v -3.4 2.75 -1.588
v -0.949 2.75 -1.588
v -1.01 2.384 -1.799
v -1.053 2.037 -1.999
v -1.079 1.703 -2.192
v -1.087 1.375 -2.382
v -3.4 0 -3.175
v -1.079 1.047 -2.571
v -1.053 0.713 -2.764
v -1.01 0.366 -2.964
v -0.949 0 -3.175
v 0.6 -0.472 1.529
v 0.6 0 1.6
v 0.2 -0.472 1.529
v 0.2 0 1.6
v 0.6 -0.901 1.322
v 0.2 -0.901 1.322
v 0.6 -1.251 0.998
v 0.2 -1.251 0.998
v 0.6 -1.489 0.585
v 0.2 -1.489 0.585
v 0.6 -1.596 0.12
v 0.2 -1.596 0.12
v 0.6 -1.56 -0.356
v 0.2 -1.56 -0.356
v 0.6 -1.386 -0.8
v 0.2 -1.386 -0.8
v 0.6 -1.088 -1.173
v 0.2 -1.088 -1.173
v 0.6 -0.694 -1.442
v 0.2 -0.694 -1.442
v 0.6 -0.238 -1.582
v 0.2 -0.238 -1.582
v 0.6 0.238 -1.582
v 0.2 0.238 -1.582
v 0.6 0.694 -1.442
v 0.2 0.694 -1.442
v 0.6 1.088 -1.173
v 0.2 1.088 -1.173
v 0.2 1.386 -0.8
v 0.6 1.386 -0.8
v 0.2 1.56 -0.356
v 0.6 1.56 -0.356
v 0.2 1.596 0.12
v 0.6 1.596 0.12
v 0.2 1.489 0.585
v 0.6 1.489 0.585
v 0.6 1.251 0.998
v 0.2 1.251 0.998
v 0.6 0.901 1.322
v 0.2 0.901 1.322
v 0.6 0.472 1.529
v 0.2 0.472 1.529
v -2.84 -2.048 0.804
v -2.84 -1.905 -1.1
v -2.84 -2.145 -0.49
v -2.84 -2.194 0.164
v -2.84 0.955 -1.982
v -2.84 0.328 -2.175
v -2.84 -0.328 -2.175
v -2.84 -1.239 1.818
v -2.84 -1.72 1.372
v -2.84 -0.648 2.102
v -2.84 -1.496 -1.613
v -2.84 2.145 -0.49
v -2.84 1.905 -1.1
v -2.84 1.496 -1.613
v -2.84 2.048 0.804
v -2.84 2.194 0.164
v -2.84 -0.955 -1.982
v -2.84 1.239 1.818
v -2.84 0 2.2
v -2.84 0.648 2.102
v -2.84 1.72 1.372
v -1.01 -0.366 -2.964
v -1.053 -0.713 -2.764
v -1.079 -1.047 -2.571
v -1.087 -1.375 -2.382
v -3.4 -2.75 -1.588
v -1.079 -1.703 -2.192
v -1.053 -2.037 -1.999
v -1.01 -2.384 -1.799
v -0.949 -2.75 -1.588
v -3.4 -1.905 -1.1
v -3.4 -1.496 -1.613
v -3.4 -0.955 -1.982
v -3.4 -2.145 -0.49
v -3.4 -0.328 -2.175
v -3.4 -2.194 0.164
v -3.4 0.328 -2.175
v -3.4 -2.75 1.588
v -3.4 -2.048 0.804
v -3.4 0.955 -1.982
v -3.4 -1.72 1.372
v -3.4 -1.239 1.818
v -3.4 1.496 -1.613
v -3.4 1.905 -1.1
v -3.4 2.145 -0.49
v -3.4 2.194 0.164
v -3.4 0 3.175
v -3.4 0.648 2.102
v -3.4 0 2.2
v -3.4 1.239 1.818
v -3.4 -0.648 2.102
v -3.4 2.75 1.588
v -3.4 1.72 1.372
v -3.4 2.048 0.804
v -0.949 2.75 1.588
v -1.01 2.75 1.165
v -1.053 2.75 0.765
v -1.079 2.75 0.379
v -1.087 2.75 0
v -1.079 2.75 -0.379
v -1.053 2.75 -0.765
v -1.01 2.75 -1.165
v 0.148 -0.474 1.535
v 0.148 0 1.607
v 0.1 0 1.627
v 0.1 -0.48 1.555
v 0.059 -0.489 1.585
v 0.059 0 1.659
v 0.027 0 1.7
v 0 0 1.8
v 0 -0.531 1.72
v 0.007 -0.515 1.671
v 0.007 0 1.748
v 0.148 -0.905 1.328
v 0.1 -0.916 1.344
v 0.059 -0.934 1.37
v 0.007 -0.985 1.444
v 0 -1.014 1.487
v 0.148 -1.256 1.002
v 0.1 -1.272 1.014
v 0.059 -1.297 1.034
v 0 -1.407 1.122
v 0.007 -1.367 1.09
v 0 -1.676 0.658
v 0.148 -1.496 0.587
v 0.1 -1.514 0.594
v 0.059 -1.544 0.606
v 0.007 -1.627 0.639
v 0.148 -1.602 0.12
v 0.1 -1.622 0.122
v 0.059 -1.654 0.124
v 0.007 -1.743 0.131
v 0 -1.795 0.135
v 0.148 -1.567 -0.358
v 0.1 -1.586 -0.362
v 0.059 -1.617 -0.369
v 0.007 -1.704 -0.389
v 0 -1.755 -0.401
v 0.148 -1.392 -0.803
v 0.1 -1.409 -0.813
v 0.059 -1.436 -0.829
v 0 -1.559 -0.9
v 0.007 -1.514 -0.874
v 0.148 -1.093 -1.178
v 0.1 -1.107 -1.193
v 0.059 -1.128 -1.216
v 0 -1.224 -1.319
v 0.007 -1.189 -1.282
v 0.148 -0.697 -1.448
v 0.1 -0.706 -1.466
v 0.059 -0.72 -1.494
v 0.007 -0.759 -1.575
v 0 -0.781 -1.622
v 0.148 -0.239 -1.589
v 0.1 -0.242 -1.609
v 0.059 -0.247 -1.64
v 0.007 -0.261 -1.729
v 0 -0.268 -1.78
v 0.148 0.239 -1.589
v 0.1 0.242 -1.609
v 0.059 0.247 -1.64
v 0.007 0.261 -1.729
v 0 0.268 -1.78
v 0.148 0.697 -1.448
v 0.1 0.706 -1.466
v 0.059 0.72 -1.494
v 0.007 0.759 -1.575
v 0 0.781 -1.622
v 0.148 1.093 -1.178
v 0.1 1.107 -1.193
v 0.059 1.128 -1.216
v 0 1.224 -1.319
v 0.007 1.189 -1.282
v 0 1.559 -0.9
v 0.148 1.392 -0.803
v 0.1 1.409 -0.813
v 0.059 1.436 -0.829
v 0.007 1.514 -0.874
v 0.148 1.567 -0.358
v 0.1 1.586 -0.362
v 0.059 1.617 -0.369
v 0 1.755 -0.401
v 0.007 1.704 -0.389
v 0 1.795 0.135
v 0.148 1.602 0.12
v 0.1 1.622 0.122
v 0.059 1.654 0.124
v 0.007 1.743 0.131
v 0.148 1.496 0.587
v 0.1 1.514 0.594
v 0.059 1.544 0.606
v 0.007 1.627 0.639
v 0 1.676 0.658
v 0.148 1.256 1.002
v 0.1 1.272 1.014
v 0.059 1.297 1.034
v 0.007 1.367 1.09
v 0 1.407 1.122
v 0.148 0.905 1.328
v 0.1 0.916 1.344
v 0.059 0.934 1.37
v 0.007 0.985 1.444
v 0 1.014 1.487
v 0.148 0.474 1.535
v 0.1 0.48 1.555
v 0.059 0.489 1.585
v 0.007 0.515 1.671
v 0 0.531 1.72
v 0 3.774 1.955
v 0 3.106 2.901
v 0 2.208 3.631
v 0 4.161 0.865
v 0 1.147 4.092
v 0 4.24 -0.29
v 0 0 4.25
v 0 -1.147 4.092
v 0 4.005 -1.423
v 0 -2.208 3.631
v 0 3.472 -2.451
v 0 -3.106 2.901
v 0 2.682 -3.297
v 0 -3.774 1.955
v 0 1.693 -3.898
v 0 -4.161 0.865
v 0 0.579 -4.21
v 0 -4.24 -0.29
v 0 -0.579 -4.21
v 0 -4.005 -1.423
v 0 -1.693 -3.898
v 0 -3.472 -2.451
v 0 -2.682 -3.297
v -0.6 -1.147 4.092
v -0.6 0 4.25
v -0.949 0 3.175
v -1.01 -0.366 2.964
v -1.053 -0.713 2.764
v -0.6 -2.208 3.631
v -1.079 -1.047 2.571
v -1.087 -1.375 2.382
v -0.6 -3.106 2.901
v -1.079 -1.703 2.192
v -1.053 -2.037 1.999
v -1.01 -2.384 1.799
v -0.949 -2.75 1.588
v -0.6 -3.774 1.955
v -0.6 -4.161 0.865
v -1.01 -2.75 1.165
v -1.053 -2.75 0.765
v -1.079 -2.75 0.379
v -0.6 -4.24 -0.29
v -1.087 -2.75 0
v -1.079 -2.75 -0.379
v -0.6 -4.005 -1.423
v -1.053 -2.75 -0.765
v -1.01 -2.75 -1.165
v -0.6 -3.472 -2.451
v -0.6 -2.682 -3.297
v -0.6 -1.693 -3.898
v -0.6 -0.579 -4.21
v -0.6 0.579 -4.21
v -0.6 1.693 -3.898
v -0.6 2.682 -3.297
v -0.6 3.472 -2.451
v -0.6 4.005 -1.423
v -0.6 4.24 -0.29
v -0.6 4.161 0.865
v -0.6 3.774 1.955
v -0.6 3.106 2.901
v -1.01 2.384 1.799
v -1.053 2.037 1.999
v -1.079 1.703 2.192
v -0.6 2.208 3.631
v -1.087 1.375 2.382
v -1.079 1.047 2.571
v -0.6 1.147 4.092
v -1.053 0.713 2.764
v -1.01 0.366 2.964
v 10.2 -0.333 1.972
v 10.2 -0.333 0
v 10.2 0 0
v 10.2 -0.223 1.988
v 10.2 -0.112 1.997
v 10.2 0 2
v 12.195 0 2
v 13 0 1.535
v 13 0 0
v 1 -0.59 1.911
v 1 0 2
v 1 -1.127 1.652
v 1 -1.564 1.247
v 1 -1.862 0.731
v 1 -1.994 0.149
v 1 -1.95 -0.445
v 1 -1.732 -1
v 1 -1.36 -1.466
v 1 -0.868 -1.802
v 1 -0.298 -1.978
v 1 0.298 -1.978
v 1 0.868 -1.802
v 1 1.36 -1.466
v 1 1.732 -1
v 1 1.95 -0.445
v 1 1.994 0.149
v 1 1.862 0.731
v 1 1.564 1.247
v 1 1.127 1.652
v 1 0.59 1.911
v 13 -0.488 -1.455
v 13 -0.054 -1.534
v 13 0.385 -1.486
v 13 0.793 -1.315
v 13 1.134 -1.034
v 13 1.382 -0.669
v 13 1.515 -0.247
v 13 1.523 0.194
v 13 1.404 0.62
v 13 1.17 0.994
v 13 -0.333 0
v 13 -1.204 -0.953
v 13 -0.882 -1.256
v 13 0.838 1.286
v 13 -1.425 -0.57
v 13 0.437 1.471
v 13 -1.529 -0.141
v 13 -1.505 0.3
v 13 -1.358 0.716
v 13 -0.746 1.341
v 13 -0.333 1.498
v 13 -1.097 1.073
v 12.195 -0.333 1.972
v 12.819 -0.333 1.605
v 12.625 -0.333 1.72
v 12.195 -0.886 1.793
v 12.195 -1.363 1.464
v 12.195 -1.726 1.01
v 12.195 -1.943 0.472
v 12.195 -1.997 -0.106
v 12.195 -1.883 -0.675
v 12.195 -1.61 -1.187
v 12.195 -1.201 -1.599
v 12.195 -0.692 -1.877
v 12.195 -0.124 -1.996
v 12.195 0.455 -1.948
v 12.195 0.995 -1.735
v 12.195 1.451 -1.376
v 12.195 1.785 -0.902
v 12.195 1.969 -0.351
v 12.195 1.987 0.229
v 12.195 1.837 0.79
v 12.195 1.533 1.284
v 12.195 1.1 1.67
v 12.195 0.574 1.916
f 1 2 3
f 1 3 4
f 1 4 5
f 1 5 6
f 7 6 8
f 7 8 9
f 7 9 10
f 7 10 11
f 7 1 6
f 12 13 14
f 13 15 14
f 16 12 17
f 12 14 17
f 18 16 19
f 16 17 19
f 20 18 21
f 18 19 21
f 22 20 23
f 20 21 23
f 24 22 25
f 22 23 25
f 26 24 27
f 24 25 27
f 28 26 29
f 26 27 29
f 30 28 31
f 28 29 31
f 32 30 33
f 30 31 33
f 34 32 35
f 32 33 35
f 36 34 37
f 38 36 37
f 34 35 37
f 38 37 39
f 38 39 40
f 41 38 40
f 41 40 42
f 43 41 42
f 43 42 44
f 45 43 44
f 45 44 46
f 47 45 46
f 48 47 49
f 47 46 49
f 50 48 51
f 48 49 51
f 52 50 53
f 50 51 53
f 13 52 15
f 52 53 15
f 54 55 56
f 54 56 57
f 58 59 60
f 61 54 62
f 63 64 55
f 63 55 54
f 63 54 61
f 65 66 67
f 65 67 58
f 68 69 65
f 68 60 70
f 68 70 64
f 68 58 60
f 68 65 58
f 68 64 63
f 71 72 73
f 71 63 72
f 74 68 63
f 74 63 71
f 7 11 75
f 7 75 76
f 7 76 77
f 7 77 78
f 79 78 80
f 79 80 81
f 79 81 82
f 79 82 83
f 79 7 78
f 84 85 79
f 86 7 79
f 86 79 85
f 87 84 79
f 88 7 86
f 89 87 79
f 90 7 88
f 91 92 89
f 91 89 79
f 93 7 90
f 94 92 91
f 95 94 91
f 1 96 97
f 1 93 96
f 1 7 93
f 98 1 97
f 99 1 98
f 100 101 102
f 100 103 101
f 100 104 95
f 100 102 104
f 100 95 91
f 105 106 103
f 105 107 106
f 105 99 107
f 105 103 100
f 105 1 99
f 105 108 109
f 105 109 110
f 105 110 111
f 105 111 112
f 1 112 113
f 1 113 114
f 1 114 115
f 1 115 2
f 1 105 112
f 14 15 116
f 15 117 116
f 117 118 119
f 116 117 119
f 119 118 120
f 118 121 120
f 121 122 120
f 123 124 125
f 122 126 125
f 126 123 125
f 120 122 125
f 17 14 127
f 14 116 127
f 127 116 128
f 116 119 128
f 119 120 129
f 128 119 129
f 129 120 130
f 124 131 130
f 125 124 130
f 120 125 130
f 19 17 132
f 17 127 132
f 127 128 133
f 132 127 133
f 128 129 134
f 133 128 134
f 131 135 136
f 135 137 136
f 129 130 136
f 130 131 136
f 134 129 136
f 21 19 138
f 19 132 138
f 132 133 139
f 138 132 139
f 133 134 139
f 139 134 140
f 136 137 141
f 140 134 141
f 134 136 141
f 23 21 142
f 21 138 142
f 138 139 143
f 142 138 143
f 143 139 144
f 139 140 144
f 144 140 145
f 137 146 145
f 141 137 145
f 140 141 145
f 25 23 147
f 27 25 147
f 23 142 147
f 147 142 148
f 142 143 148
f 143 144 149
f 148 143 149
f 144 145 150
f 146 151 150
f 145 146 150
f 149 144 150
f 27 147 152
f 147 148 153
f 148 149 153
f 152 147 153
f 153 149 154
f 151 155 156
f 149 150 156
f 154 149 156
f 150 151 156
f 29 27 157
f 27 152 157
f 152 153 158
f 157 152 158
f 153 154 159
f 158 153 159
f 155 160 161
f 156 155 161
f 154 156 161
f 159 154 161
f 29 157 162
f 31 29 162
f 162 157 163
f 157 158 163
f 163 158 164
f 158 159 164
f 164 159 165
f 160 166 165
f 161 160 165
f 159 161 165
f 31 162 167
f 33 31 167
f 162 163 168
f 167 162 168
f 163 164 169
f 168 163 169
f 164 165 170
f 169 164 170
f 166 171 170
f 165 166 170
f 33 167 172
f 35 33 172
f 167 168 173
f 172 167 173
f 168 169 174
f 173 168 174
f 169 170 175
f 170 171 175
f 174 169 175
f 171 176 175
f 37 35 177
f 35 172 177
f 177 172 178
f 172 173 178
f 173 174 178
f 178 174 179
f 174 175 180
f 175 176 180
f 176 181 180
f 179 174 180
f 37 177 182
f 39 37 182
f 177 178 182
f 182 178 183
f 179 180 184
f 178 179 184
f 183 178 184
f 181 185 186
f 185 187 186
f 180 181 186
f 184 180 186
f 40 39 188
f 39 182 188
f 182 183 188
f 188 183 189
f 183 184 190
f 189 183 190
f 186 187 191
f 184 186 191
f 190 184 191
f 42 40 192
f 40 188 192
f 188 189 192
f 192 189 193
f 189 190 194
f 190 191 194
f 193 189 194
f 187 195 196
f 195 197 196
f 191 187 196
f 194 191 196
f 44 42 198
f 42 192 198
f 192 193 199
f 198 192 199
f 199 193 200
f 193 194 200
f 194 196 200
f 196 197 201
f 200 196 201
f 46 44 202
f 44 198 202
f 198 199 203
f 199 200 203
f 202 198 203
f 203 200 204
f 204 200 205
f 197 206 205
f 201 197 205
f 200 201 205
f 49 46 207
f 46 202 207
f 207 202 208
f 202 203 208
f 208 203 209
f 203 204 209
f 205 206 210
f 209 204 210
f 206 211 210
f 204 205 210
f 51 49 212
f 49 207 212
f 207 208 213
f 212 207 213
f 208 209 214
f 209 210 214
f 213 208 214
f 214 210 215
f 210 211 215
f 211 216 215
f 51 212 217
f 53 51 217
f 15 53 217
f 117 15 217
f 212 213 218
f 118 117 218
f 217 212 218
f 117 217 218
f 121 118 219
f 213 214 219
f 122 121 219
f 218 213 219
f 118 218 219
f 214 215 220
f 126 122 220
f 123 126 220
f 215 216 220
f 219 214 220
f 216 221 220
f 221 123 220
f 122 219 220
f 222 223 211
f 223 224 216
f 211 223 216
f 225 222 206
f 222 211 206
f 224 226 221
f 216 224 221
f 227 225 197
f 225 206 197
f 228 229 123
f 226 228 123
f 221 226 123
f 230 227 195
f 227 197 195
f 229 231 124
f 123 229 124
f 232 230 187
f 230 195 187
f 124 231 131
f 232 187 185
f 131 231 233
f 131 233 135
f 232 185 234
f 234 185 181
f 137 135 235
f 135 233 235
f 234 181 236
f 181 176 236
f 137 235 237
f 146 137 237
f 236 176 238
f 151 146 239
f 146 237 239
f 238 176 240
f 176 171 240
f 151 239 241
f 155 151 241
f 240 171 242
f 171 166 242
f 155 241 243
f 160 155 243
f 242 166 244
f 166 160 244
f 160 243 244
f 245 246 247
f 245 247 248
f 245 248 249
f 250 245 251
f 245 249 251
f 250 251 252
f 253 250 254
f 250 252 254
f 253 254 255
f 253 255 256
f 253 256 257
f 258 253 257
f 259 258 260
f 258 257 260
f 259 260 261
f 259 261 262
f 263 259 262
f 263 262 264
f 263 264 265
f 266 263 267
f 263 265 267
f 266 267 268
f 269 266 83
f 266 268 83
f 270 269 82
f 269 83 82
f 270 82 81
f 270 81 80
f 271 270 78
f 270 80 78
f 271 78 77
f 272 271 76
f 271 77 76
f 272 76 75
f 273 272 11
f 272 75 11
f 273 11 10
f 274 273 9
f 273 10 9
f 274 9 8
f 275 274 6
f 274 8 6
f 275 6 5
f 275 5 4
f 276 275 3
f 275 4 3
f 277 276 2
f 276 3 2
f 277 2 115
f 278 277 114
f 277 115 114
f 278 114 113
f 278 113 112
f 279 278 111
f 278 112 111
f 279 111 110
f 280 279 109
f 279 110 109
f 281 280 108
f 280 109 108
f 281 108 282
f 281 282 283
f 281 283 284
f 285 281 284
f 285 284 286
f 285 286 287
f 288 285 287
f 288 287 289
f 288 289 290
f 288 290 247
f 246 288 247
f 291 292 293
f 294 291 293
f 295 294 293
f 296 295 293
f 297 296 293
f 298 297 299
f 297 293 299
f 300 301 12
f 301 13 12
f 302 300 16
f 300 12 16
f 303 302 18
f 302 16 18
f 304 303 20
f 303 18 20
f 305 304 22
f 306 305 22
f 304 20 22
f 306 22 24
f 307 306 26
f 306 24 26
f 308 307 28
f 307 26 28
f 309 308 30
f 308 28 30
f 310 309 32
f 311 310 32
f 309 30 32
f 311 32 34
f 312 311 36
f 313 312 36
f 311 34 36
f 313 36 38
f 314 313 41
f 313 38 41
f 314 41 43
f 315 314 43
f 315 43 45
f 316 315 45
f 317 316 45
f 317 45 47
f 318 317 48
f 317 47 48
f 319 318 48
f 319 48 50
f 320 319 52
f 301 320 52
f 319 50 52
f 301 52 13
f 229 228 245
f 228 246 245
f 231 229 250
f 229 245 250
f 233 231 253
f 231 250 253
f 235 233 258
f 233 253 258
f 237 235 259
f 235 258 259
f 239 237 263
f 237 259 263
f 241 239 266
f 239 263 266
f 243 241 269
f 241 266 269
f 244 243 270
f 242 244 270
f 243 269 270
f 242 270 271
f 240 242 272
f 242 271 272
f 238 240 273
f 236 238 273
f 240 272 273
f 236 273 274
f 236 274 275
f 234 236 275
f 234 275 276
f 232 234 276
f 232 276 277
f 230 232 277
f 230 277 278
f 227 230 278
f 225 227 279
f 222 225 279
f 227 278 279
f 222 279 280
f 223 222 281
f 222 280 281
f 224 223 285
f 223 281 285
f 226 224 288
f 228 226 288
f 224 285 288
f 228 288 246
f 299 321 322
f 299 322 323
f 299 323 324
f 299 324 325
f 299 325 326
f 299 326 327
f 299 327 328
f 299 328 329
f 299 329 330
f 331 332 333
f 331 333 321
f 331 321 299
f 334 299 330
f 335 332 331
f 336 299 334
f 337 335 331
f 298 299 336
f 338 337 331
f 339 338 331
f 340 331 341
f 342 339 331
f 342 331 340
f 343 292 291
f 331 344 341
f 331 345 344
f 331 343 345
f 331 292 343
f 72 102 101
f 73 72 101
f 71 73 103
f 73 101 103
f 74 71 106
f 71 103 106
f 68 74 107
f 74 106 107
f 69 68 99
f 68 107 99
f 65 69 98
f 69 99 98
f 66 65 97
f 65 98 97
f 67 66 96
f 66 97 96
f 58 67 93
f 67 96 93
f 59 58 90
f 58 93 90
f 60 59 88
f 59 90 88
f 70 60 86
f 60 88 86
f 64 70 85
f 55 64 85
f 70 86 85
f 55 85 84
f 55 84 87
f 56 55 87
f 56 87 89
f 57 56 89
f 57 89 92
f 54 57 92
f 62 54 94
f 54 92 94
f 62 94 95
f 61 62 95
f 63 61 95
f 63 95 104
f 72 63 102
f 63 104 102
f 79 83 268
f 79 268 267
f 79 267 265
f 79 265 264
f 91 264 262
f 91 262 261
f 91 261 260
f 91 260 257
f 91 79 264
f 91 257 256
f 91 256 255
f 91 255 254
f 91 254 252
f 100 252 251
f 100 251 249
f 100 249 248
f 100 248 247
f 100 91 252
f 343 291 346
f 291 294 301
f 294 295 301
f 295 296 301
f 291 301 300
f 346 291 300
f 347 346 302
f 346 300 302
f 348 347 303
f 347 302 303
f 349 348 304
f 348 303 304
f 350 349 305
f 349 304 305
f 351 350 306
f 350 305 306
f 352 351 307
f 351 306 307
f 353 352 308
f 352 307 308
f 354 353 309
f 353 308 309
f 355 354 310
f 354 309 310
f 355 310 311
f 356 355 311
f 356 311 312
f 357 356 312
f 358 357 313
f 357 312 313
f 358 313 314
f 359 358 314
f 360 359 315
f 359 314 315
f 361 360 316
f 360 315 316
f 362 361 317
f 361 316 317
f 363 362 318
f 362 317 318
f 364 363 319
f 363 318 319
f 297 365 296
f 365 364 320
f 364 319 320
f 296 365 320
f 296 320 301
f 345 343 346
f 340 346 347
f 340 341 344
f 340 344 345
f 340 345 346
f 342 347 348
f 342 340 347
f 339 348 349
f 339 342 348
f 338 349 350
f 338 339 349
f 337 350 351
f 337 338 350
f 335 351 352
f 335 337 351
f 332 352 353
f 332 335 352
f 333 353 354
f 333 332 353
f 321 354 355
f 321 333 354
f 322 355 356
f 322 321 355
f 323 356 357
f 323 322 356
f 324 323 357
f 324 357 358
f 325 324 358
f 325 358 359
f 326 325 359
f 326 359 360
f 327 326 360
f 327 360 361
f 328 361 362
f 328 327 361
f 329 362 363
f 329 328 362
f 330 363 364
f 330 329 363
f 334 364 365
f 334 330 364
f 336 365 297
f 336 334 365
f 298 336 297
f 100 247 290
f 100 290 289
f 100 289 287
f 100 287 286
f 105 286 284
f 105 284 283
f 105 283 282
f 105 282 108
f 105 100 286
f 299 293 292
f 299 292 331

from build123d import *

# Parameters (mm, degrees)
EXTRUDE1_REACH           = 19.467
SKETCH11_W               = 2.8
SKETCH11_H               = 0.333333333
POINT_CUT_EXTRUDE8_DEPTH = 15.322185587
SKETCH16_R               = 2.2
CUT_EXTRUDE1_DEPTH       = 0.56


with BuildPart() as part:
    # Sketch1 → base-Revolve (revolve)
    with BuildSketch(Plane.XY, mode=Mode.PRIVATE) as base_revolve_sk:
        with BuildLine():
            Line((0, 4.25), (-0.6, 4.25))
            Line((-0.6, 4.25), (-1.087379544, 2.75))
            Line((-1.087379544, 2.75), (-3.4, 2.75))
            Line((-3.4, 2.75), (-3.4, 0))
            Line((-3.4, 0), (-2.84, 0))
            Line((-2.84, 0), (0, 0))
            Line((0, 0), (13, 0))
            Line((13, 0), (13, 2))
            Line((13, 2), (1, 2))
            Line((1, 2), (0.6, 1.6))
            Line((0.6, 1.6), (0.2, 1.6))
            ThreePointArc((0.2, 1.6), (0.058578644, 1.658578644), (0, 1.8))
            Line((0, 1.8), (0, 4.25))
        make_face()
    revolve(base_revolve_sk.sketch.rotate(Axis((0, 0, 0), (1, 0, 0)), 90), axis=Axis((0, 0, 0), (1, 0, 0)))

    # Extrude1: up to this cone (the profile starts outside it)
    extrude1_end = Plane(origin=(-3.4, 0, 0), z_dir=(1, 0, 0)).offset(1.419092291) * Cone(3.078e-06, 57.084593283, 18.547907709, align=(Align.CENTER, Align.CENTER, Align.MIN), mode=Mode.PRIVATE)
    # Sketch15 → Extrude1 (add, up to the surface)
    with BuildSketch(Plane.ZY.offset(3.4), mode=Mode.PRIVATE) as extrude1_sk1:
        Polygon((-1.58771324, 2.75), (-3.175426481, 0), (-1.58771324, -2.75), (1.58771324, -2.75), (3.175426481, 0), (1.58771324, 2.75), align=None)
    extrude1_tool1 = extrude(extrude1_sk1.sketch, amount=-EXTRUDE1_REACH, mode=Mode.PRIVATE) - extrude1_end
    add(extrude1_tool1.solids().sort_by_distance((-3.4, 0, 0))[0])

    # Sketch8 → point_Cut-Revolve1 (revolve, cut)
    with BuildSketch(Plane.XY, mode=Mode.PRIVATE) as point_cut_revolve1_sk:
        Polygon((13, 0), (13.508, 0), (13.508, 2.508), (12.194596374, 2.508), (12.194596374, 2), (13, 1.535), align=None)
    revolve(point_cut_revolve1_sk.sketch.rotate(Axis((0, 0, 0), (1, 0, 0)), 90), axis=Axis((0, 0, 0), (1, 0, 0)), mode=Mode.SUBTRACT)

    # Sketch11 → point_Cut-Extrude8 (cut, through all)
    with BuildSketch(Plane.XY):
        with Locations((11.6, -0.166666667)):
            Rectangle(SKETCH11_W, SKETCH11_H)
    extrude(amount=POINT_CUT_EXTRUDE8_DEPTH, mode=Mode.SUBTRACT)

    # Sketch16 → Cut-Extrude1 (cut)
    with BuildSketch(Plane.ZY.offset(3.4)):
        Circle(SKETCH16_R)
    extrude(amount=-CUT_EXTRUDE1_DEPTH, mode=Mode.SUBTRACT)


solid = part.part
